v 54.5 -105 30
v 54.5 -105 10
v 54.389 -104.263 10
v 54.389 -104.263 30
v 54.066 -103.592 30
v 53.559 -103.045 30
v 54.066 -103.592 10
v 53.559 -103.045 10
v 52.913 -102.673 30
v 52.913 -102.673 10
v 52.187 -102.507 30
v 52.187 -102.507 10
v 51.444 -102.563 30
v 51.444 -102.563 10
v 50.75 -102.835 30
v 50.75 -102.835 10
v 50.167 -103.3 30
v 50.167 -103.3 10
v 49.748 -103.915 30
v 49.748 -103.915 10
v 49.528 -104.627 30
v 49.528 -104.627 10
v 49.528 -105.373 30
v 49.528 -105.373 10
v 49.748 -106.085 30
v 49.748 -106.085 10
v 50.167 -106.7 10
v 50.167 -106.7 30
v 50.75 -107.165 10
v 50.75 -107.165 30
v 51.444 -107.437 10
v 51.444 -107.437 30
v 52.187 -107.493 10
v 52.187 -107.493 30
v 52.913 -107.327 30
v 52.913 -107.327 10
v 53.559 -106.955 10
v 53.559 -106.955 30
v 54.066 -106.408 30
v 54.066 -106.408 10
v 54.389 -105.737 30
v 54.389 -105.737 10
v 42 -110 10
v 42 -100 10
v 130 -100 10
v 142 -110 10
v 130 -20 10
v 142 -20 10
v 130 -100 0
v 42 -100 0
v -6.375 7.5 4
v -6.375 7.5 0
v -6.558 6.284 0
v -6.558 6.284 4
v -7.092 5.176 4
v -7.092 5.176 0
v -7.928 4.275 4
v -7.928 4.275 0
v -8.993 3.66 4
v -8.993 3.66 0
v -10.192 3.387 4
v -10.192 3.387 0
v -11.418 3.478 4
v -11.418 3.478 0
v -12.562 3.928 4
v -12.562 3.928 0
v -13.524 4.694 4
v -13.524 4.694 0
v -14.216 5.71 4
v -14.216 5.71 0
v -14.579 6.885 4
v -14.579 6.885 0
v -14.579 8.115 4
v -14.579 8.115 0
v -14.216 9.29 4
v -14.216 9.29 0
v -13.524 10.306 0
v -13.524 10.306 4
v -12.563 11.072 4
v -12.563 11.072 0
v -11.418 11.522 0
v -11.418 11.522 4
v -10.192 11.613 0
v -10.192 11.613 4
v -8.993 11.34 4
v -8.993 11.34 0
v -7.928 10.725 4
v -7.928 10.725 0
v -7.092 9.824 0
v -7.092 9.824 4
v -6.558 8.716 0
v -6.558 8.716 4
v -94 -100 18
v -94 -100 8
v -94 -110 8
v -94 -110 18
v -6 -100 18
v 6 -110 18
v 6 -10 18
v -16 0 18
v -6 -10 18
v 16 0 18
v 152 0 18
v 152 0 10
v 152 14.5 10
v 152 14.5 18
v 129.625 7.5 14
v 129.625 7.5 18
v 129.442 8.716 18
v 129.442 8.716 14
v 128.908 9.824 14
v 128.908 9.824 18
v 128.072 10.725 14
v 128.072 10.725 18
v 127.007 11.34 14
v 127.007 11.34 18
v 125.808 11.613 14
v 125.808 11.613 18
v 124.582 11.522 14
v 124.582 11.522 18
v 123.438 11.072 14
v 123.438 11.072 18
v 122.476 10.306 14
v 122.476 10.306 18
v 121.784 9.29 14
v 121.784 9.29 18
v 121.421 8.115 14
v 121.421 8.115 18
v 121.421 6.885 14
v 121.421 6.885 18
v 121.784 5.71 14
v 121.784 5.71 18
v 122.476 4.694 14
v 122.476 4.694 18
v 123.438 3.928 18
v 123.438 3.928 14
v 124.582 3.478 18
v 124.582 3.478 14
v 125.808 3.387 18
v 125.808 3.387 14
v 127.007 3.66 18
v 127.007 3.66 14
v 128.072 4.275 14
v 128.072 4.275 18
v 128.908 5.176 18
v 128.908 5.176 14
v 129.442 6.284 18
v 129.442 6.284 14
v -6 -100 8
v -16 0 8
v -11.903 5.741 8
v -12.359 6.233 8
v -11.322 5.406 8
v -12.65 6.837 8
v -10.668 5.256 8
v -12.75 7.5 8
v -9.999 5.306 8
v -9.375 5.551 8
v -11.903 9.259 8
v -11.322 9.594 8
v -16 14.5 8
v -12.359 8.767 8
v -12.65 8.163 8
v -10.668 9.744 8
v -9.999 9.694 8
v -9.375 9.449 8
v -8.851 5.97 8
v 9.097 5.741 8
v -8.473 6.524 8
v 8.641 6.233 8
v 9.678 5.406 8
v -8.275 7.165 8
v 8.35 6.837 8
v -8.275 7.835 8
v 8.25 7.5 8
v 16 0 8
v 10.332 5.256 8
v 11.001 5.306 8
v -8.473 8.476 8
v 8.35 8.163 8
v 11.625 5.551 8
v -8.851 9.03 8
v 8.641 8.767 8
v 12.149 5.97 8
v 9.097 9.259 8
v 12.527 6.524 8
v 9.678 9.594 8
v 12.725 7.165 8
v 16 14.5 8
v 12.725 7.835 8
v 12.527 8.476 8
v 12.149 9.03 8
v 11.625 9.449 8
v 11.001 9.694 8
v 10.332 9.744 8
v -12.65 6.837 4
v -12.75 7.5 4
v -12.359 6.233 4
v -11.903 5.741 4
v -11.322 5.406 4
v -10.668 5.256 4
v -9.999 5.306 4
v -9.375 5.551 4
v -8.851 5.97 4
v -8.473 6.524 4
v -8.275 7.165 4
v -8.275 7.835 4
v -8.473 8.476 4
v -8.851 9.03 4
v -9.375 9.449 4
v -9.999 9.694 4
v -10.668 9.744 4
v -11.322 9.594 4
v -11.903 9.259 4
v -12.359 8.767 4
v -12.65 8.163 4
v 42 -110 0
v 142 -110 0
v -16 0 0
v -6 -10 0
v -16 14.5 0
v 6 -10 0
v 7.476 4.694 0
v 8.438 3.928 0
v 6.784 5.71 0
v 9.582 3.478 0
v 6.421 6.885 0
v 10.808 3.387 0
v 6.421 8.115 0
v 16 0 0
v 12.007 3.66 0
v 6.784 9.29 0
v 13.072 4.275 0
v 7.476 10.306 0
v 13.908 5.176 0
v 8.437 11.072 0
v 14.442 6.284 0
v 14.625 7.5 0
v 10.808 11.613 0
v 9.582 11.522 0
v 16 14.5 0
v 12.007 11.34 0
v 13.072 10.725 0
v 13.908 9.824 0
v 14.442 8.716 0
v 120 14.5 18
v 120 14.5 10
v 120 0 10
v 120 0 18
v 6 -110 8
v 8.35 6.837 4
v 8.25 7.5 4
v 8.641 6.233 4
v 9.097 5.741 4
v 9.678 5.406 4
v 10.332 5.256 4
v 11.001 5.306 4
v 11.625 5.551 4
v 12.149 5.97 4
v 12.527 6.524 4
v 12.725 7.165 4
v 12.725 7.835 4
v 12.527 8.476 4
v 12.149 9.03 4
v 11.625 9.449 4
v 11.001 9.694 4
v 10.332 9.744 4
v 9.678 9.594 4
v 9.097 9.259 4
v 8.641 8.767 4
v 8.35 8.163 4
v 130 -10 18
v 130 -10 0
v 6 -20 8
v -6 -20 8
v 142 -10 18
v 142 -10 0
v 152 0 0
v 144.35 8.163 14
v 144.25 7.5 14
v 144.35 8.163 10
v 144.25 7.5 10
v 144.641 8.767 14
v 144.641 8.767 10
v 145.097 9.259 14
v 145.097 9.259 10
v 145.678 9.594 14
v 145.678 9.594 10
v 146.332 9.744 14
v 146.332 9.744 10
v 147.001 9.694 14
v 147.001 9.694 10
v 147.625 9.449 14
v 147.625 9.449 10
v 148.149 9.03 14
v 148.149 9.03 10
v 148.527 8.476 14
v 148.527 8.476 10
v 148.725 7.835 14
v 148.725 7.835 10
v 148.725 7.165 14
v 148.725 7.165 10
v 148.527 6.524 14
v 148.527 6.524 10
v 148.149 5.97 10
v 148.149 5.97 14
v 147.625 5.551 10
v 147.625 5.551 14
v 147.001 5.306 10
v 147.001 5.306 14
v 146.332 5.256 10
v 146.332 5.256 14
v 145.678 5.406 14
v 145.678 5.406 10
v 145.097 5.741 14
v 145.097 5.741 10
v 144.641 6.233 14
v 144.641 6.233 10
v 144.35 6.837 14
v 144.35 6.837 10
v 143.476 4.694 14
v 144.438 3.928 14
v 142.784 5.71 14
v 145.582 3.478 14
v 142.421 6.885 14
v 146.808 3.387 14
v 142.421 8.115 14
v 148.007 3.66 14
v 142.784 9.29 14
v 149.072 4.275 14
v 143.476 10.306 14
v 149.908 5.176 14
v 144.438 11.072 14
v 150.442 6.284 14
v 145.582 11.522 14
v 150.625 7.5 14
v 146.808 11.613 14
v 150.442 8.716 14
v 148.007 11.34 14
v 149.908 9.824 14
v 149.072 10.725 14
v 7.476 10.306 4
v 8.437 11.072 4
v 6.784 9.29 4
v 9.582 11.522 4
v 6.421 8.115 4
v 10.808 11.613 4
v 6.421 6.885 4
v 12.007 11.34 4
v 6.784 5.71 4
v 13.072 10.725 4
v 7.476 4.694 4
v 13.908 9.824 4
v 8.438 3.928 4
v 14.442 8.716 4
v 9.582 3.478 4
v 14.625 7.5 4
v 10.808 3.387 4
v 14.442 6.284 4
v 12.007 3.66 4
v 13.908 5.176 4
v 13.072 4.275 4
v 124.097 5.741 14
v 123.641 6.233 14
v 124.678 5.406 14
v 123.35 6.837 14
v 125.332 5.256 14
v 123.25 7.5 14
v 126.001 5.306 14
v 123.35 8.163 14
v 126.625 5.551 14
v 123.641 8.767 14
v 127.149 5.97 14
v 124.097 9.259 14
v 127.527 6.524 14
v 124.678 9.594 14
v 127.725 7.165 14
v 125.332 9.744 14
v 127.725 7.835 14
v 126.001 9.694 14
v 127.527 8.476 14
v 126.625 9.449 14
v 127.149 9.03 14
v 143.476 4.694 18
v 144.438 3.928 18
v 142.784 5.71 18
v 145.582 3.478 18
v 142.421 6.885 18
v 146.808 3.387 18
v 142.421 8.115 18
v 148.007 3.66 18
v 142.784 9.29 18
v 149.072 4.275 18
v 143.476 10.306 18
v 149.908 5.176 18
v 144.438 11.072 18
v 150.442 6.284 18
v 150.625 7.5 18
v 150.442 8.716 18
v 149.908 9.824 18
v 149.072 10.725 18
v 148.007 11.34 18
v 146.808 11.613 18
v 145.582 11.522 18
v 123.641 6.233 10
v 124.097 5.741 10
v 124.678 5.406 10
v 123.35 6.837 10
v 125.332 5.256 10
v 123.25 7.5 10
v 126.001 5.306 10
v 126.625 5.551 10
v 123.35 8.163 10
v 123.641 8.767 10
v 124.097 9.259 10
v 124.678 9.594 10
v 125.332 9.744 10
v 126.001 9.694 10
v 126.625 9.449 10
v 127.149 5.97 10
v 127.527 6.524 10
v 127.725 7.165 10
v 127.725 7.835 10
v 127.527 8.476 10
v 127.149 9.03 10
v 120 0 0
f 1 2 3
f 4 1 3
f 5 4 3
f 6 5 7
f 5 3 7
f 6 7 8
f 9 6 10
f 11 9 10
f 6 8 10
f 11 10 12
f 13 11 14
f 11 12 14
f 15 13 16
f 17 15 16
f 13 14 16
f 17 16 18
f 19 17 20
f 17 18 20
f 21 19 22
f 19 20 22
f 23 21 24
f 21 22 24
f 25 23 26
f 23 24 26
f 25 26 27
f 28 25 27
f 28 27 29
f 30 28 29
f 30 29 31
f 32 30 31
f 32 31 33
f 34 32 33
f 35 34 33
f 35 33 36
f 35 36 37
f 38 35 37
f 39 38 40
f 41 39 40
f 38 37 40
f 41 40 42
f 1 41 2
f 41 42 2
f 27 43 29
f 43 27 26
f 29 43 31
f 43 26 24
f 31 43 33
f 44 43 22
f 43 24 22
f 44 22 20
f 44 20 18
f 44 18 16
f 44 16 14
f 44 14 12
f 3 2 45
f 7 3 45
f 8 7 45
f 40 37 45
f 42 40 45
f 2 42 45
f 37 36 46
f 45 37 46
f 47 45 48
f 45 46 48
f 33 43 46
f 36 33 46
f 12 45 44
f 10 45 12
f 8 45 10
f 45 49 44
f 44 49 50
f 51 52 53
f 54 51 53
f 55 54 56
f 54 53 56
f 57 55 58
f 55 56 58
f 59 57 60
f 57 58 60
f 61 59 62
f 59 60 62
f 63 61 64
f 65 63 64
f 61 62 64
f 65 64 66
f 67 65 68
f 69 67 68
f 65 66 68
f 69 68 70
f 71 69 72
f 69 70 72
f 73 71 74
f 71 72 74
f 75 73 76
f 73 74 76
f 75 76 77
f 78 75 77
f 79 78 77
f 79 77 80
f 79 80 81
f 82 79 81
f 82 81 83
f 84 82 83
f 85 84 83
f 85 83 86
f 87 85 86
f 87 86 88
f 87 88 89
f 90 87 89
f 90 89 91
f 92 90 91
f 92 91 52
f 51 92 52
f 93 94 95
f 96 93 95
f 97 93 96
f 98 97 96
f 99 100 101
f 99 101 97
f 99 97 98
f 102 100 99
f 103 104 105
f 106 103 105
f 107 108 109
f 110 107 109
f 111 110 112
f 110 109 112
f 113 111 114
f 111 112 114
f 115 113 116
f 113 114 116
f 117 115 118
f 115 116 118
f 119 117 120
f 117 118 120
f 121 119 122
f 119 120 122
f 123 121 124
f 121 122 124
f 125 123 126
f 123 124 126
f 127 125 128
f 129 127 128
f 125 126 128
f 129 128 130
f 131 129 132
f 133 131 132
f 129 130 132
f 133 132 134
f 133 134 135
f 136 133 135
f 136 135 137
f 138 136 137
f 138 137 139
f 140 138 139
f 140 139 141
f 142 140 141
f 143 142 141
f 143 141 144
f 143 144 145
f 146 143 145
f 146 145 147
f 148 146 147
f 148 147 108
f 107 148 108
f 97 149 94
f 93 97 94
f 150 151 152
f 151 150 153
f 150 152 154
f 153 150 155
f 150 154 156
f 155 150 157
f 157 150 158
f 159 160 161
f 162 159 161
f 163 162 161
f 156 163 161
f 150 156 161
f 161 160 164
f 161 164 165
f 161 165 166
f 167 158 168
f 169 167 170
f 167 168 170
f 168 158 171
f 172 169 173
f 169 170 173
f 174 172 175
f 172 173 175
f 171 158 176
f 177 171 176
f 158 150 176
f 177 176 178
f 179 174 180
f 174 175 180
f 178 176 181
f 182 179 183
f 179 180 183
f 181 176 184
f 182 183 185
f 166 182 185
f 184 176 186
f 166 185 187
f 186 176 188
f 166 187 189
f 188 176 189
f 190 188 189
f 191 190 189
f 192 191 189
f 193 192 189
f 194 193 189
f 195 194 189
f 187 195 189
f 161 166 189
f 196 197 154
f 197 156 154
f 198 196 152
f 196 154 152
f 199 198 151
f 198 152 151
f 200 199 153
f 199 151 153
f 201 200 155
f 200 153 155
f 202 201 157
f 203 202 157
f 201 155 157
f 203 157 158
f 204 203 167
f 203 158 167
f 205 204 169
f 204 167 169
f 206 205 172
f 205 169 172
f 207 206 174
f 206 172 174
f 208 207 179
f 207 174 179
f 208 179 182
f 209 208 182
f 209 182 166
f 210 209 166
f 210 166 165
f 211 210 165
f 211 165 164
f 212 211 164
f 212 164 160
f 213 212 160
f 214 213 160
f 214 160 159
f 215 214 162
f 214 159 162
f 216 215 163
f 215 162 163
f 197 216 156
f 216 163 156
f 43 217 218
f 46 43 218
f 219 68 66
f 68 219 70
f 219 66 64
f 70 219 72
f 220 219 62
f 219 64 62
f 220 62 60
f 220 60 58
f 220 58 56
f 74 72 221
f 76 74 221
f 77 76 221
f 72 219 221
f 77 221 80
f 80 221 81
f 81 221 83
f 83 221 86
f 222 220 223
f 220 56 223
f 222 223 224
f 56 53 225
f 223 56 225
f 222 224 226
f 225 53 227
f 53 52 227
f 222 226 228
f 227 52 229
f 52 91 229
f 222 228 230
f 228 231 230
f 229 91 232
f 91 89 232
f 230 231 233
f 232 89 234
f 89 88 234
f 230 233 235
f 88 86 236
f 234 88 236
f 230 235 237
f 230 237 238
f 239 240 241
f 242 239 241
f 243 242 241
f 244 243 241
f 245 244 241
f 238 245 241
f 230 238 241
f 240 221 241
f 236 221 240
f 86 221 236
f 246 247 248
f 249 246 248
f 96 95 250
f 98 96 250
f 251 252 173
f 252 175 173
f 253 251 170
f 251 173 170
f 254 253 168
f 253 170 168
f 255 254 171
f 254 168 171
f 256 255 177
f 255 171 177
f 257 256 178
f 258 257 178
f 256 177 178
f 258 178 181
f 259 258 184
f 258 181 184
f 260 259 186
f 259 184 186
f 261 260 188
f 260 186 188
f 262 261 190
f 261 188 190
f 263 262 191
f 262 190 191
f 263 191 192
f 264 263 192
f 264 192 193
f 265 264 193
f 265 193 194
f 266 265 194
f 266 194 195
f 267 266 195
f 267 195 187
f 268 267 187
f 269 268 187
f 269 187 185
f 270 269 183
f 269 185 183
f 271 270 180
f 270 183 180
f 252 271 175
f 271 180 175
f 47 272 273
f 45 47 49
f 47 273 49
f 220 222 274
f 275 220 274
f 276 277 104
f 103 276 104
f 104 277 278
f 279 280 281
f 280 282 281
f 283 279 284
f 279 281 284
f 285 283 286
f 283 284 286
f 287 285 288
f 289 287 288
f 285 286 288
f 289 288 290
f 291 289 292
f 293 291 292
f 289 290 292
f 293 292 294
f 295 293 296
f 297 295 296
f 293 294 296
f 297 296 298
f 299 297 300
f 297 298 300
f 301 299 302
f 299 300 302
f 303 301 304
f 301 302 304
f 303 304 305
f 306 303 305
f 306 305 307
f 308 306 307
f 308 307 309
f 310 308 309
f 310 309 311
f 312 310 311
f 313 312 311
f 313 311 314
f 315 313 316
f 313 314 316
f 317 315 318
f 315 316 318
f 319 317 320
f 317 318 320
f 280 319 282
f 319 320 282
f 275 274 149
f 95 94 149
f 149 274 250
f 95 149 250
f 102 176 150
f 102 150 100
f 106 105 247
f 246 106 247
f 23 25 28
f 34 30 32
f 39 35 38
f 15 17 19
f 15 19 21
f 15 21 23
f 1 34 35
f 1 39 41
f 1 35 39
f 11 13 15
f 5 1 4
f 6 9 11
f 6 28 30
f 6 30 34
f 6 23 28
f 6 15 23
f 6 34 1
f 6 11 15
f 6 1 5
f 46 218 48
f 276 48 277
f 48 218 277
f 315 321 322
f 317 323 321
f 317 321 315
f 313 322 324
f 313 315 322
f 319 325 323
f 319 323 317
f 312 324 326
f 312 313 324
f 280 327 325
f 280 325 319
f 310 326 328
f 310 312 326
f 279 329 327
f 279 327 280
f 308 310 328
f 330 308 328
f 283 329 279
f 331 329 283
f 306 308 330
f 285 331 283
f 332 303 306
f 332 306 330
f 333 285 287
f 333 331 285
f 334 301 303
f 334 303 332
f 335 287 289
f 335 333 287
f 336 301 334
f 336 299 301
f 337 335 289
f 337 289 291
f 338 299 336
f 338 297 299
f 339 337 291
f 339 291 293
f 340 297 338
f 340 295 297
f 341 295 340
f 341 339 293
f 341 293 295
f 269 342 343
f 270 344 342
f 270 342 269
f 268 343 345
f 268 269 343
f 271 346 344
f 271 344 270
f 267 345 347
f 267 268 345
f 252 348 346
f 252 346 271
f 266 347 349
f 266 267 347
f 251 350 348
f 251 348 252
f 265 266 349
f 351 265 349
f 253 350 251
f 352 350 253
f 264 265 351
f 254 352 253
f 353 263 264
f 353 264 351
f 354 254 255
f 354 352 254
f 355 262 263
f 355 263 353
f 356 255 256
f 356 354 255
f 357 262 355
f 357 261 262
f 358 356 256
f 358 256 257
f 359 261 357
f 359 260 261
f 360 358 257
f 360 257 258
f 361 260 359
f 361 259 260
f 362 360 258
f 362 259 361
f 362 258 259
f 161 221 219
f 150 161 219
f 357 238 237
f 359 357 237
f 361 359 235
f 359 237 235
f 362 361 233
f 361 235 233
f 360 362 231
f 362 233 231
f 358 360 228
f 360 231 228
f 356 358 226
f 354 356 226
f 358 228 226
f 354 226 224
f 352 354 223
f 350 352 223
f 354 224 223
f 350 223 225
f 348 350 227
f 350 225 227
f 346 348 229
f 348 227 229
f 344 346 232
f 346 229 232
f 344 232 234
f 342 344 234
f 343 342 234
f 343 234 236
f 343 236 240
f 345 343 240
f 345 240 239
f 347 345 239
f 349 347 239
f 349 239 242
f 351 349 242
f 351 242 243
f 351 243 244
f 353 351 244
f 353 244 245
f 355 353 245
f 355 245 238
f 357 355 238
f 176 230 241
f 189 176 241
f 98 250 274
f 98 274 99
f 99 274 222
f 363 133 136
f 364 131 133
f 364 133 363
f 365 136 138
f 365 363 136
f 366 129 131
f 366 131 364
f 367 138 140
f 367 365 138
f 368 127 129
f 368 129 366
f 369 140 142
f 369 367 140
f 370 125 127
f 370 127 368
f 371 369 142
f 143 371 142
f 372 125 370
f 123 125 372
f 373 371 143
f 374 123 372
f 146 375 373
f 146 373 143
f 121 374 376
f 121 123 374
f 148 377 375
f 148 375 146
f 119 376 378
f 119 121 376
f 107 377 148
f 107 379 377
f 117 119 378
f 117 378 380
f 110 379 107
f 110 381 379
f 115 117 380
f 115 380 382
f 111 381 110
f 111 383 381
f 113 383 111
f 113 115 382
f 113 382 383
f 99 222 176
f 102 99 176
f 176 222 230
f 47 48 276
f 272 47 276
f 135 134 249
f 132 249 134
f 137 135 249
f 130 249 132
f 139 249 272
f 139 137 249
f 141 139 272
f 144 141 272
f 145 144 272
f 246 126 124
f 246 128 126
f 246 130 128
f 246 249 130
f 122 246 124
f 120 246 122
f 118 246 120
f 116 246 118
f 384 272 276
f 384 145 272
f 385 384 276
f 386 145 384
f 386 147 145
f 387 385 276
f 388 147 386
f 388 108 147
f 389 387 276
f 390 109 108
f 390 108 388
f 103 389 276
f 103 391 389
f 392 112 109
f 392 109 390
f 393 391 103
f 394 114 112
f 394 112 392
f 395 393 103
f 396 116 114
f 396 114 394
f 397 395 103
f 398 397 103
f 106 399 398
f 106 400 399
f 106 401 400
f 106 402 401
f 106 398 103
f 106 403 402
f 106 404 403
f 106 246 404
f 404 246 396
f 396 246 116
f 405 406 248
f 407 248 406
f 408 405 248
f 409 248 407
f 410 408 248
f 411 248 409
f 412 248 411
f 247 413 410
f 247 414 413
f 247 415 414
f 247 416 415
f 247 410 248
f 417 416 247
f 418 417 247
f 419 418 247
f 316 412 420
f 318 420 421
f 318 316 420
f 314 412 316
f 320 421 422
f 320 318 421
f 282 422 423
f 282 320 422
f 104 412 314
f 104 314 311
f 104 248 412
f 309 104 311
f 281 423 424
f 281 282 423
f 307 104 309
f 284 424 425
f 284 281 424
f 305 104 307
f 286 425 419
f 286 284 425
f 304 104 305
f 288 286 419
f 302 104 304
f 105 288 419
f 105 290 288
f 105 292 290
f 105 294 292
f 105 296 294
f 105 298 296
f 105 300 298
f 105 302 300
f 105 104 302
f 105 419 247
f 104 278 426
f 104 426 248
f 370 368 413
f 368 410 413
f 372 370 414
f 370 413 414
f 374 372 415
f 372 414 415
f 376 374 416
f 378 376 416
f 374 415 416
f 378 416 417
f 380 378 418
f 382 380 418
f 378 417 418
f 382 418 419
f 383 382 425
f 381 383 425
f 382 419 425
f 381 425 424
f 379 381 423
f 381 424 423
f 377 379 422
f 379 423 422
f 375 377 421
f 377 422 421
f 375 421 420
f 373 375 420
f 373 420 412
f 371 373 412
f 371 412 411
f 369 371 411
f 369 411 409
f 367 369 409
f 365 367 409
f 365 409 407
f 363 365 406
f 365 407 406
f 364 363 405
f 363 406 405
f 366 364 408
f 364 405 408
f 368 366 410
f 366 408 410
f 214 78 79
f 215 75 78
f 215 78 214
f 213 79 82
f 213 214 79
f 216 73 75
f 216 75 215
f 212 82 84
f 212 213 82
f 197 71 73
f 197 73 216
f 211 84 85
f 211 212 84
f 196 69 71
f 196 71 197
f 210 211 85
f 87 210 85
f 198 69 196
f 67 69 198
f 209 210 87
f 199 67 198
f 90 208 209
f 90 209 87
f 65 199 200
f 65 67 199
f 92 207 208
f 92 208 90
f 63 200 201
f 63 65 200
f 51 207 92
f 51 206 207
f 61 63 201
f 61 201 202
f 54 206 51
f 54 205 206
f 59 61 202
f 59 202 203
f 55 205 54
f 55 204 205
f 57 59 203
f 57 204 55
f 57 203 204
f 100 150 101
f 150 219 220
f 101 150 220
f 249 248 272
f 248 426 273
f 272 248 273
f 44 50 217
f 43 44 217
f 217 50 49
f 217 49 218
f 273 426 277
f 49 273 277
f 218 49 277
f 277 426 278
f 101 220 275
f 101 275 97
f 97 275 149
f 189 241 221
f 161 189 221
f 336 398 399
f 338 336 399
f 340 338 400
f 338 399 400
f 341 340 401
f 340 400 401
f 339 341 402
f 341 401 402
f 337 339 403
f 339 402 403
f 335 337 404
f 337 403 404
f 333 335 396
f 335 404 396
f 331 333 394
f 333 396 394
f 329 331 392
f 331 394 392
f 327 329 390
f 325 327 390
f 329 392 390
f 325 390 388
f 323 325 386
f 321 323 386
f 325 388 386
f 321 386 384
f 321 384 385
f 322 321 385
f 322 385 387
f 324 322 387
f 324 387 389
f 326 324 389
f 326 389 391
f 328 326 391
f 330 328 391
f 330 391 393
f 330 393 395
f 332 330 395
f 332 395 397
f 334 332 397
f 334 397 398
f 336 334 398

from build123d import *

# Parameters (mm, degrees)
F1_DEPTH        = 18
F2_W            = 14.5
F2_H            = 10
F3_DEPTH        = 32
F4_W            = 14.5
F4_H            = 10
F5_DEPTH        = 32
F7_DEPTH        = 100.001
F9_DEPTH        = 100.001
F10_R           = 2.5
F11_DEPTH       = 20
F13_D           = 4.5
F13_CBORE_D     = 8.25
F13_CBORE_DEPTH = 4
F15_D           = 4.5
F15_CBORE_D     = 8.25
F15_CBORE_DEPTH = 4


with BuildPart() as f1:
    # F0 (on Top) → F1 (new body)
    with BuildSketch(Plane.XY):
        Polygon((-16, 14.5), (-16, 0), (-6, -10), (-6, -100), (-94, -100), (-94, -110), (6, -110), (6, -10), (16, 0), (16, 14.5), align=None)
    extrude(amount=F1_DEPTH)

    # F4 (on face) → F5 (cut, through all)
    with BuildSketch(Plane.YZ.offset(16)):
        with Locations((7.25, 13)):
            Rectangle(F4_W, F4_H)
    extrude(amount=-F5_DEPTH, mode=Mode.SUBTRACT)

    # F8 (on face) → F9 (cut, through all)
    with BuildSketch(Plane.YZ.offset(6)):
        Polygon((-110, 8), (-110, 0), (-10, 0), (-20, 8), align=None)
    extrude(amount=-F9_DEPTH, mode=Mode.SUBTRACT)

    # F13 (through all)
    with Locations(Plane(origin=(0, 0, 0), x_dir=(1, 0, 0), z_dir=(0, 0, -1))):
        with Locations((-10.5, -7.5), (10.5, -7.5)):
            CounterBoreHole(F13_D / 2, F13_CBORE_D / 2, F13_CBORE_DEPTH)


with BuildPart() as f1b:
    # F0 (on Top) → F1, piece 2 (new body)
    with BuildSketch(Plane.XY):
        Polygon((120, 14.5), (120, 0), (130, -10), (130, -100), (42, -100), (42, -110), (142, -110), (142, -10), (152, 0), (152, 14.5), align=None)
    extrude(amount=F1_DEPTH)

    # F2 (on face) → F3 (cut, through all)
    with BuildSketch(Plane.YZ.offset(152)):
        with Locations((7.25, 5)):
            Rectangle(F2_W, F2_H)
    extrude(amount=-F3_DEPTH, mode=Mode.SUBTRACT)

    # F6 (on face) → F7 (cut, through all)
    with BuildSketch(Plane.YZ.offset(142)):
        Polygon((-10, 18), (-110, 18), (-110, 10), (-20, 10), align=None)
    extrude(amount=-F7_DEPTH, mode=Mode.SUBTRACT)

    # F10 (on face) → F11 (join)
    with BuildSketch(Plane.XY.offset(10)):
        with Locations((52, -105)):
            Circle(F10_R)
    extrude(amount=F11_DEPTH)

    # F15 (through all)
    with Locations(Plane.XY.offset(18)):
        with Locations((125.5, 7.5), (146.5, 7.5)):
            CounterBoreHole(F15_D / 2, F15_CBORE_D / 2, F15_CBORE_DEPTH)


solid = Compound([f1.part, f1b.part])
